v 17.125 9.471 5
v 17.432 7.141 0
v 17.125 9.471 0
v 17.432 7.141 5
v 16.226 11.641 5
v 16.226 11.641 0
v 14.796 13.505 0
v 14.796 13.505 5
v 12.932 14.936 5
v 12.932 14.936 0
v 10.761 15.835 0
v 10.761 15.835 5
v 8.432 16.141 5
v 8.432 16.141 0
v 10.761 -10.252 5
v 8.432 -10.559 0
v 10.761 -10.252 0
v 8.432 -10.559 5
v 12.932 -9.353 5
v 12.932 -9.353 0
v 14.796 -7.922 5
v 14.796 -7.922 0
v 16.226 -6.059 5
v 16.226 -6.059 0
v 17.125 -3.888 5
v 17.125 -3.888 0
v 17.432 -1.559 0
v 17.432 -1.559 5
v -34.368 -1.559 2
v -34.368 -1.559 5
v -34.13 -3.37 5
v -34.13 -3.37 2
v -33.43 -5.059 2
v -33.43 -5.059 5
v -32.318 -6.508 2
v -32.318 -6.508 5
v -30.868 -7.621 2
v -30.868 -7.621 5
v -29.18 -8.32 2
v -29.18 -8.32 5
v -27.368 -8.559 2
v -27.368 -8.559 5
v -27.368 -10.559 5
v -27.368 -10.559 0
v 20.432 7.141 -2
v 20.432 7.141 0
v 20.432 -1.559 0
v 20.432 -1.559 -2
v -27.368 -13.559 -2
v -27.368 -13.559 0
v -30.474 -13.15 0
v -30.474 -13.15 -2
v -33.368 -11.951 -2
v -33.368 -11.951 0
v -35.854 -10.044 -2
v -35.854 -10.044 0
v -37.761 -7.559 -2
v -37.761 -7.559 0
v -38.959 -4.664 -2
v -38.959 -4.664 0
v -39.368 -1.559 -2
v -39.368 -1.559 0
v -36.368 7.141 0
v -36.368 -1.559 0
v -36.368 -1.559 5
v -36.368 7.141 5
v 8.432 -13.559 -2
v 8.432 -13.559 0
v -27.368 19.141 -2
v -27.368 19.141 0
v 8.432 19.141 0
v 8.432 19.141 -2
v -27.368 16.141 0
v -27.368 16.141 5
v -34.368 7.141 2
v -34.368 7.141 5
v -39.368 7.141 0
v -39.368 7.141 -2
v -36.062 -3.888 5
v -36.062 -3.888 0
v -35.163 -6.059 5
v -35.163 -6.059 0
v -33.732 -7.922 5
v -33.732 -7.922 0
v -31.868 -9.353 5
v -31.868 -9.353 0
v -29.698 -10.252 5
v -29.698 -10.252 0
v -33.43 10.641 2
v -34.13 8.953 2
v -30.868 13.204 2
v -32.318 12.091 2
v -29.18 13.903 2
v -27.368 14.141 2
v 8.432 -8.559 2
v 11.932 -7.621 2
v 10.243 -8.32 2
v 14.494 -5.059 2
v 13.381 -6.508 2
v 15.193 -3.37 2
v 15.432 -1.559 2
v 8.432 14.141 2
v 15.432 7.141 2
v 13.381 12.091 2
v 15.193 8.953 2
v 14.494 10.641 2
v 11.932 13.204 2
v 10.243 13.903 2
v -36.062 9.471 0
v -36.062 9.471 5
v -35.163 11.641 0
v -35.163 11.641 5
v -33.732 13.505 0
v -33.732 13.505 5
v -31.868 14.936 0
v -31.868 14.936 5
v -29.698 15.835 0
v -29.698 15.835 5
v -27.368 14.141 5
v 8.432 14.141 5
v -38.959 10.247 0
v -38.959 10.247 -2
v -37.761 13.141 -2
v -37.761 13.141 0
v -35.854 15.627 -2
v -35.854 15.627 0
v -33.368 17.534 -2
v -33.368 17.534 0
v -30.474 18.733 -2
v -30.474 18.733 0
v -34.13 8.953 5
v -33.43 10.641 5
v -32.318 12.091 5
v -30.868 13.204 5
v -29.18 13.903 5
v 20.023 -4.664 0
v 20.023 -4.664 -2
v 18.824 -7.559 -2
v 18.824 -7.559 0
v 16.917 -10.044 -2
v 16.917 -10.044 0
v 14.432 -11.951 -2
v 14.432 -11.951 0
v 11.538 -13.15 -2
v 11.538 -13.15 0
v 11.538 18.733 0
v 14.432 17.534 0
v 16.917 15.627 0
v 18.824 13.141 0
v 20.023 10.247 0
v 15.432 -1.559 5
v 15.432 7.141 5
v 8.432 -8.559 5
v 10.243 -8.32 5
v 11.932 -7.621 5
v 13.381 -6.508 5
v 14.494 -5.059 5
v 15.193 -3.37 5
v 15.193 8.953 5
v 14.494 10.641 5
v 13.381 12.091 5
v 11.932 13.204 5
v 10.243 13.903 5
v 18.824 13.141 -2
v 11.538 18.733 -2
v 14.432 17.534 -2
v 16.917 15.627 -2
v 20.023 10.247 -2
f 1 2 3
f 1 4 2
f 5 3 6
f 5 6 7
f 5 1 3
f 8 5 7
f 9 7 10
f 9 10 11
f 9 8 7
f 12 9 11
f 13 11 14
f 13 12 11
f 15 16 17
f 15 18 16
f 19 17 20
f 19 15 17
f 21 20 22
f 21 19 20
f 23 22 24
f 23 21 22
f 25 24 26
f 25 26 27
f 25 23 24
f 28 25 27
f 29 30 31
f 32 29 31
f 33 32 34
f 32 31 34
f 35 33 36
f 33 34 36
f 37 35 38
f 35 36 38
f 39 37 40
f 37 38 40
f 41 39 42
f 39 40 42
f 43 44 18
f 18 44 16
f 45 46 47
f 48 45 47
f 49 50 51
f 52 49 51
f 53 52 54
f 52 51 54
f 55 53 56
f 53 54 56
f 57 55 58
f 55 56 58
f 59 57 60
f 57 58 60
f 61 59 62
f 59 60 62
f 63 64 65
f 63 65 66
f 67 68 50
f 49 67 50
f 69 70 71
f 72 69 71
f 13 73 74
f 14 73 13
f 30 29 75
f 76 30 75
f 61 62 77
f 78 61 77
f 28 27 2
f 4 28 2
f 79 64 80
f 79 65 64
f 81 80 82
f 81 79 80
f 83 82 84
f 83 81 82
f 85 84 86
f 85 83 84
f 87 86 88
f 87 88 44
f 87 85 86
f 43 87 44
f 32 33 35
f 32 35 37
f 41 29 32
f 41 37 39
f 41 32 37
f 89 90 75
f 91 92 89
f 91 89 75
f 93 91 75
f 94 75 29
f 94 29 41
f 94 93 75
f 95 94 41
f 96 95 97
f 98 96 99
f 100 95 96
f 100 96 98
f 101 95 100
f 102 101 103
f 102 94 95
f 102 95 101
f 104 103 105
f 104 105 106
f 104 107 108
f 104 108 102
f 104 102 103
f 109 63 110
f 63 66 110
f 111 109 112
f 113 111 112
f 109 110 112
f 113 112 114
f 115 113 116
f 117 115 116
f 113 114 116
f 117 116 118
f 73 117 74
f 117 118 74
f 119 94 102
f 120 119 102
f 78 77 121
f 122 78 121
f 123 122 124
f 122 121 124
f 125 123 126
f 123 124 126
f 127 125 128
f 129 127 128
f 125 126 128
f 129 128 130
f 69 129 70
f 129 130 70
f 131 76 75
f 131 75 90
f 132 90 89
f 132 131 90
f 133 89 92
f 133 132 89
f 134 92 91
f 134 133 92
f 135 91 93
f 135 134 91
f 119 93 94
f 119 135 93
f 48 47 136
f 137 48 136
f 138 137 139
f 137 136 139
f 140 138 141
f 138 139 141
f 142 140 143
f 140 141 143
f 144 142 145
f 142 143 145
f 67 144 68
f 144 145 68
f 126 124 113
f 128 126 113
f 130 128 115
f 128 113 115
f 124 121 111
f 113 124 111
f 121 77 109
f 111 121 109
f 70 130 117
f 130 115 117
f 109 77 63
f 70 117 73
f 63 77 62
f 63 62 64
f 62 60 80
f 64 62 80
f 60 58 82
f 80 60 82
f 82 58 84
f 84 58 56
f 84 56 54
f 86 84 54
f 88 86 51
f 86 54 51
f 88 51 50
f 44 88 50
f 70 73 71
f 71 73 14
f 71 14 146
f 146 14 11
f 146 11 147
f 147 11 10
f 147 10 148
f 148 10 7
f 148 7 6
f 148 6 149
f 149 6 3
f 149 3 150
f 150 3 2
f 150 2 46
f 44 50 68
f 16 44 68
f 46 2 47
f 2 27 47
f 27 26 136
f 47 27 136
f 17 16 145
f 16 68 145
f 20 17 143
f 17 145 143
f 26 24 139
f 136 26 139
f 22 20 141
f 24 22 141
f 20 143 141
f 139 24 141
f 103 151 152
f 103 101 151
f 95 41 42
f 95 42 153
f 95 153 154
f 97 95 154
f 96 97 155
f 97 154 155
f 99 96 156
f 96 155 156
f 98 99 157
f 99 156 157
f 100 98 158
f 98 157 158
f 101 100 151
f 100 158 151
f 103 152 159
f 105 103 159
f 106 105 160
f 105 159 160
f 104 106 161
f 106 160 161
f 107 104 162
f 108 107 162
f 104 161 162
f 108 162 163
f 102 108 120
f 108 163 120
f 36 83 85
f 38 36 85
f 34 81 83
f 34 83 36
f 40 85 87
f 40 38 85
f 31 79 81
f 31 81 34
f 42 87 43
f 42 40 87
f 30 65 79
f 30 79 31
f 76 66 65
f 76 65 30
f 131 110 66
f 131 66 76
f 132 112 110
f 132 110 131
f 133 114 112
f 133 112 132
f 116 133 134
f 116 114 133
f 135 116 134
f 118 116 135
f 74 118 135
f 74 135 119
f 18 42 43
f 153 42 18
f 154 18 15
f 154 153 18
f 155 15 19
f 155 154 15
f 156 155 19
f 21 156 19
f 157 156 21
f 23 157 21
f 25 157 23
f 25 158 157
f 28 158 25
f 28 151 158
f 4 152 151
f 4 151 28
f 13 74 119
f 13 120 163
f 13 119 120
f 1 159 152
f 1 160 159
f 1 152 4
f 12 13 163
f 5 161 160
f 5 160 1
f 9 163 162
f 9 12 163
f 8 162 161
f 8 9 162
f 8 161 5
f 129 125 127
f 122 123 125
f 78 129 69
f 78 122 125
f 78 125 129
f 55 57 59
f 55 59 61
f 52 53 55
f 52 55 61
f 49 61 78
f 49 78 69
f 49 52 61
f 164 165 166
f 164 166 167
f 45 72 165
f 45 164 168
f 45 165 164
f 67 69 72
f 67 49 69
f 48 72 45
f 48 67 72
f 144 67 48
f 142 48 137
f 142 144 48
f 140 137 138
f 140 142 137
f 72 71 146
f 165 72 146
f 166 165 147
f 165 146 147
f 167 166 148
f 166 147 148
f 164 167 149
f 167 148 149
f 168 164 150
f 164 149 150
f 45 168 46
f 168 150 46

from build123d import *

# Parameters (mm, degrees)
F0_W     = 53.8
F0_H     = 26.7
F1_DEPTH = 5
F2_R     = 9
F3_T     = -2
F5_DEPTH = 2


with BuildPart() as f1:
    # F0 (on Top) → F1 (new body)
    with BuildSketch(Plane.XY):
        with Locations((-9.468303, 2.791487)):
            Rectangle(F0_W, F0_H)
    extrude(amount=F1_DEPTH)

    # F2
    f2_edges = [f1.edges().sort_by_distance(p)[0] for p in [
        (-36.368303, 16.141487, 2.5),
        (17.431697, 16.141487, 2.5),
        (17.431697, -10.558513, 2.5),
        (-36.368303, -10.558513, 2.5),
    ]]
    fillet(f2_edges, radius=F2_R)

    # F3
    f3_openings = [f1.faces().sort_by_distance(p)[0] for p in [
        (-9.468303, 2.791487, 5),
    ]]
    offset(amount=F3_T, openings=f3_openings)

    # F4 (on face) → F5 (join)
    with BuildSketch(Plane(origin=(0, 0, 0), x_dir=(1, 0, 0), z_dir=(0, 0, -1))):
        with BuildLine():
            Line((20.431697, -7.141487), (20.431697, 1.558513))
            ThreePointArc((20.431697, 1.558513), (16.916978, 10.043794), (8.431697, 13.558513))
            Line((8.431697, 13.558513), (-27.368303, 13.558513))
            ThreePointArc((-27.368303, 13.558513), (-35.853585, 10.043794), (-39.368303, 1.558513))
            Line((-39.368303, 1.558513), (-39.368303, -7.141487))
            ThreePointArc((-39.368303, -7.141487), (-35.853585, -15.626768), (-27.368303, -19.141487))
            Line((-27.368303, -19.141487), (8.431697, -19.141487))
            ThreePointArc((8.431697, -19.141487), (16.916978, -15.626768), (20.431697, -7.141487))
        make_face()
        with BuildLine():
            Line((17.431697, 1.558513), (17.431697, -7.141487))
            ThreePointArc((17.431697, -7.141487), (14.795658, -13.505448), (8.431697, -16.141487))
            Line((8.431697, -16.141487), (-27.368303, -16.141487))
            ThreePointArc((-27.368303, -16.141487), (-33.732264, -13.505448), (-36.368303, -7.141487))
            Line((-36.368303, -7.141487), (-36.368303, 1.558513))
            ThreePointArc((-36.368303, 1.558513), (-33.732264, 7.922474), (-27.368303, 10.558513))
            Line((-27.368303, 10.558513), (8.431697, 10.558513))
            ThreePointArc((8.431697, 10.558513), (14.795658, 7.922474), (17.431697, 1.558513))
        make_face(mode=Mode.SUBTRACT)
        with BuildLine():
            ThreePointArc((8.431697, -16.141487), (14.795658, -13.505448), (17.431697, -7.141487))
            Line((17.431697, -7.141487), (17.431697, 1.558513))
            ThreePointArc((17.431697, 1.558513), (14.795658, 7.922474), (8.431697, 10.558513))
            Line((8.431697, 10.558513), (-27.368303, 10.558513))
            ThreePointArc((-27.368303, 10.558513), (-33.732264, 7.922474), (-36.368303, 1.558513))
            Line((-36.368303, 1.558513), (-36.368303, -7.141487))
            ThreePointArc((-36.368303, -7.141487), (-33.732264, -13.505448), (-27.368303, -16.141487))
            Line((-27.368303, -16.141487), (8.431697, -16.141487))
        make_face()
    extrude(amount=F5_DEPTH)


solid = f1.part
